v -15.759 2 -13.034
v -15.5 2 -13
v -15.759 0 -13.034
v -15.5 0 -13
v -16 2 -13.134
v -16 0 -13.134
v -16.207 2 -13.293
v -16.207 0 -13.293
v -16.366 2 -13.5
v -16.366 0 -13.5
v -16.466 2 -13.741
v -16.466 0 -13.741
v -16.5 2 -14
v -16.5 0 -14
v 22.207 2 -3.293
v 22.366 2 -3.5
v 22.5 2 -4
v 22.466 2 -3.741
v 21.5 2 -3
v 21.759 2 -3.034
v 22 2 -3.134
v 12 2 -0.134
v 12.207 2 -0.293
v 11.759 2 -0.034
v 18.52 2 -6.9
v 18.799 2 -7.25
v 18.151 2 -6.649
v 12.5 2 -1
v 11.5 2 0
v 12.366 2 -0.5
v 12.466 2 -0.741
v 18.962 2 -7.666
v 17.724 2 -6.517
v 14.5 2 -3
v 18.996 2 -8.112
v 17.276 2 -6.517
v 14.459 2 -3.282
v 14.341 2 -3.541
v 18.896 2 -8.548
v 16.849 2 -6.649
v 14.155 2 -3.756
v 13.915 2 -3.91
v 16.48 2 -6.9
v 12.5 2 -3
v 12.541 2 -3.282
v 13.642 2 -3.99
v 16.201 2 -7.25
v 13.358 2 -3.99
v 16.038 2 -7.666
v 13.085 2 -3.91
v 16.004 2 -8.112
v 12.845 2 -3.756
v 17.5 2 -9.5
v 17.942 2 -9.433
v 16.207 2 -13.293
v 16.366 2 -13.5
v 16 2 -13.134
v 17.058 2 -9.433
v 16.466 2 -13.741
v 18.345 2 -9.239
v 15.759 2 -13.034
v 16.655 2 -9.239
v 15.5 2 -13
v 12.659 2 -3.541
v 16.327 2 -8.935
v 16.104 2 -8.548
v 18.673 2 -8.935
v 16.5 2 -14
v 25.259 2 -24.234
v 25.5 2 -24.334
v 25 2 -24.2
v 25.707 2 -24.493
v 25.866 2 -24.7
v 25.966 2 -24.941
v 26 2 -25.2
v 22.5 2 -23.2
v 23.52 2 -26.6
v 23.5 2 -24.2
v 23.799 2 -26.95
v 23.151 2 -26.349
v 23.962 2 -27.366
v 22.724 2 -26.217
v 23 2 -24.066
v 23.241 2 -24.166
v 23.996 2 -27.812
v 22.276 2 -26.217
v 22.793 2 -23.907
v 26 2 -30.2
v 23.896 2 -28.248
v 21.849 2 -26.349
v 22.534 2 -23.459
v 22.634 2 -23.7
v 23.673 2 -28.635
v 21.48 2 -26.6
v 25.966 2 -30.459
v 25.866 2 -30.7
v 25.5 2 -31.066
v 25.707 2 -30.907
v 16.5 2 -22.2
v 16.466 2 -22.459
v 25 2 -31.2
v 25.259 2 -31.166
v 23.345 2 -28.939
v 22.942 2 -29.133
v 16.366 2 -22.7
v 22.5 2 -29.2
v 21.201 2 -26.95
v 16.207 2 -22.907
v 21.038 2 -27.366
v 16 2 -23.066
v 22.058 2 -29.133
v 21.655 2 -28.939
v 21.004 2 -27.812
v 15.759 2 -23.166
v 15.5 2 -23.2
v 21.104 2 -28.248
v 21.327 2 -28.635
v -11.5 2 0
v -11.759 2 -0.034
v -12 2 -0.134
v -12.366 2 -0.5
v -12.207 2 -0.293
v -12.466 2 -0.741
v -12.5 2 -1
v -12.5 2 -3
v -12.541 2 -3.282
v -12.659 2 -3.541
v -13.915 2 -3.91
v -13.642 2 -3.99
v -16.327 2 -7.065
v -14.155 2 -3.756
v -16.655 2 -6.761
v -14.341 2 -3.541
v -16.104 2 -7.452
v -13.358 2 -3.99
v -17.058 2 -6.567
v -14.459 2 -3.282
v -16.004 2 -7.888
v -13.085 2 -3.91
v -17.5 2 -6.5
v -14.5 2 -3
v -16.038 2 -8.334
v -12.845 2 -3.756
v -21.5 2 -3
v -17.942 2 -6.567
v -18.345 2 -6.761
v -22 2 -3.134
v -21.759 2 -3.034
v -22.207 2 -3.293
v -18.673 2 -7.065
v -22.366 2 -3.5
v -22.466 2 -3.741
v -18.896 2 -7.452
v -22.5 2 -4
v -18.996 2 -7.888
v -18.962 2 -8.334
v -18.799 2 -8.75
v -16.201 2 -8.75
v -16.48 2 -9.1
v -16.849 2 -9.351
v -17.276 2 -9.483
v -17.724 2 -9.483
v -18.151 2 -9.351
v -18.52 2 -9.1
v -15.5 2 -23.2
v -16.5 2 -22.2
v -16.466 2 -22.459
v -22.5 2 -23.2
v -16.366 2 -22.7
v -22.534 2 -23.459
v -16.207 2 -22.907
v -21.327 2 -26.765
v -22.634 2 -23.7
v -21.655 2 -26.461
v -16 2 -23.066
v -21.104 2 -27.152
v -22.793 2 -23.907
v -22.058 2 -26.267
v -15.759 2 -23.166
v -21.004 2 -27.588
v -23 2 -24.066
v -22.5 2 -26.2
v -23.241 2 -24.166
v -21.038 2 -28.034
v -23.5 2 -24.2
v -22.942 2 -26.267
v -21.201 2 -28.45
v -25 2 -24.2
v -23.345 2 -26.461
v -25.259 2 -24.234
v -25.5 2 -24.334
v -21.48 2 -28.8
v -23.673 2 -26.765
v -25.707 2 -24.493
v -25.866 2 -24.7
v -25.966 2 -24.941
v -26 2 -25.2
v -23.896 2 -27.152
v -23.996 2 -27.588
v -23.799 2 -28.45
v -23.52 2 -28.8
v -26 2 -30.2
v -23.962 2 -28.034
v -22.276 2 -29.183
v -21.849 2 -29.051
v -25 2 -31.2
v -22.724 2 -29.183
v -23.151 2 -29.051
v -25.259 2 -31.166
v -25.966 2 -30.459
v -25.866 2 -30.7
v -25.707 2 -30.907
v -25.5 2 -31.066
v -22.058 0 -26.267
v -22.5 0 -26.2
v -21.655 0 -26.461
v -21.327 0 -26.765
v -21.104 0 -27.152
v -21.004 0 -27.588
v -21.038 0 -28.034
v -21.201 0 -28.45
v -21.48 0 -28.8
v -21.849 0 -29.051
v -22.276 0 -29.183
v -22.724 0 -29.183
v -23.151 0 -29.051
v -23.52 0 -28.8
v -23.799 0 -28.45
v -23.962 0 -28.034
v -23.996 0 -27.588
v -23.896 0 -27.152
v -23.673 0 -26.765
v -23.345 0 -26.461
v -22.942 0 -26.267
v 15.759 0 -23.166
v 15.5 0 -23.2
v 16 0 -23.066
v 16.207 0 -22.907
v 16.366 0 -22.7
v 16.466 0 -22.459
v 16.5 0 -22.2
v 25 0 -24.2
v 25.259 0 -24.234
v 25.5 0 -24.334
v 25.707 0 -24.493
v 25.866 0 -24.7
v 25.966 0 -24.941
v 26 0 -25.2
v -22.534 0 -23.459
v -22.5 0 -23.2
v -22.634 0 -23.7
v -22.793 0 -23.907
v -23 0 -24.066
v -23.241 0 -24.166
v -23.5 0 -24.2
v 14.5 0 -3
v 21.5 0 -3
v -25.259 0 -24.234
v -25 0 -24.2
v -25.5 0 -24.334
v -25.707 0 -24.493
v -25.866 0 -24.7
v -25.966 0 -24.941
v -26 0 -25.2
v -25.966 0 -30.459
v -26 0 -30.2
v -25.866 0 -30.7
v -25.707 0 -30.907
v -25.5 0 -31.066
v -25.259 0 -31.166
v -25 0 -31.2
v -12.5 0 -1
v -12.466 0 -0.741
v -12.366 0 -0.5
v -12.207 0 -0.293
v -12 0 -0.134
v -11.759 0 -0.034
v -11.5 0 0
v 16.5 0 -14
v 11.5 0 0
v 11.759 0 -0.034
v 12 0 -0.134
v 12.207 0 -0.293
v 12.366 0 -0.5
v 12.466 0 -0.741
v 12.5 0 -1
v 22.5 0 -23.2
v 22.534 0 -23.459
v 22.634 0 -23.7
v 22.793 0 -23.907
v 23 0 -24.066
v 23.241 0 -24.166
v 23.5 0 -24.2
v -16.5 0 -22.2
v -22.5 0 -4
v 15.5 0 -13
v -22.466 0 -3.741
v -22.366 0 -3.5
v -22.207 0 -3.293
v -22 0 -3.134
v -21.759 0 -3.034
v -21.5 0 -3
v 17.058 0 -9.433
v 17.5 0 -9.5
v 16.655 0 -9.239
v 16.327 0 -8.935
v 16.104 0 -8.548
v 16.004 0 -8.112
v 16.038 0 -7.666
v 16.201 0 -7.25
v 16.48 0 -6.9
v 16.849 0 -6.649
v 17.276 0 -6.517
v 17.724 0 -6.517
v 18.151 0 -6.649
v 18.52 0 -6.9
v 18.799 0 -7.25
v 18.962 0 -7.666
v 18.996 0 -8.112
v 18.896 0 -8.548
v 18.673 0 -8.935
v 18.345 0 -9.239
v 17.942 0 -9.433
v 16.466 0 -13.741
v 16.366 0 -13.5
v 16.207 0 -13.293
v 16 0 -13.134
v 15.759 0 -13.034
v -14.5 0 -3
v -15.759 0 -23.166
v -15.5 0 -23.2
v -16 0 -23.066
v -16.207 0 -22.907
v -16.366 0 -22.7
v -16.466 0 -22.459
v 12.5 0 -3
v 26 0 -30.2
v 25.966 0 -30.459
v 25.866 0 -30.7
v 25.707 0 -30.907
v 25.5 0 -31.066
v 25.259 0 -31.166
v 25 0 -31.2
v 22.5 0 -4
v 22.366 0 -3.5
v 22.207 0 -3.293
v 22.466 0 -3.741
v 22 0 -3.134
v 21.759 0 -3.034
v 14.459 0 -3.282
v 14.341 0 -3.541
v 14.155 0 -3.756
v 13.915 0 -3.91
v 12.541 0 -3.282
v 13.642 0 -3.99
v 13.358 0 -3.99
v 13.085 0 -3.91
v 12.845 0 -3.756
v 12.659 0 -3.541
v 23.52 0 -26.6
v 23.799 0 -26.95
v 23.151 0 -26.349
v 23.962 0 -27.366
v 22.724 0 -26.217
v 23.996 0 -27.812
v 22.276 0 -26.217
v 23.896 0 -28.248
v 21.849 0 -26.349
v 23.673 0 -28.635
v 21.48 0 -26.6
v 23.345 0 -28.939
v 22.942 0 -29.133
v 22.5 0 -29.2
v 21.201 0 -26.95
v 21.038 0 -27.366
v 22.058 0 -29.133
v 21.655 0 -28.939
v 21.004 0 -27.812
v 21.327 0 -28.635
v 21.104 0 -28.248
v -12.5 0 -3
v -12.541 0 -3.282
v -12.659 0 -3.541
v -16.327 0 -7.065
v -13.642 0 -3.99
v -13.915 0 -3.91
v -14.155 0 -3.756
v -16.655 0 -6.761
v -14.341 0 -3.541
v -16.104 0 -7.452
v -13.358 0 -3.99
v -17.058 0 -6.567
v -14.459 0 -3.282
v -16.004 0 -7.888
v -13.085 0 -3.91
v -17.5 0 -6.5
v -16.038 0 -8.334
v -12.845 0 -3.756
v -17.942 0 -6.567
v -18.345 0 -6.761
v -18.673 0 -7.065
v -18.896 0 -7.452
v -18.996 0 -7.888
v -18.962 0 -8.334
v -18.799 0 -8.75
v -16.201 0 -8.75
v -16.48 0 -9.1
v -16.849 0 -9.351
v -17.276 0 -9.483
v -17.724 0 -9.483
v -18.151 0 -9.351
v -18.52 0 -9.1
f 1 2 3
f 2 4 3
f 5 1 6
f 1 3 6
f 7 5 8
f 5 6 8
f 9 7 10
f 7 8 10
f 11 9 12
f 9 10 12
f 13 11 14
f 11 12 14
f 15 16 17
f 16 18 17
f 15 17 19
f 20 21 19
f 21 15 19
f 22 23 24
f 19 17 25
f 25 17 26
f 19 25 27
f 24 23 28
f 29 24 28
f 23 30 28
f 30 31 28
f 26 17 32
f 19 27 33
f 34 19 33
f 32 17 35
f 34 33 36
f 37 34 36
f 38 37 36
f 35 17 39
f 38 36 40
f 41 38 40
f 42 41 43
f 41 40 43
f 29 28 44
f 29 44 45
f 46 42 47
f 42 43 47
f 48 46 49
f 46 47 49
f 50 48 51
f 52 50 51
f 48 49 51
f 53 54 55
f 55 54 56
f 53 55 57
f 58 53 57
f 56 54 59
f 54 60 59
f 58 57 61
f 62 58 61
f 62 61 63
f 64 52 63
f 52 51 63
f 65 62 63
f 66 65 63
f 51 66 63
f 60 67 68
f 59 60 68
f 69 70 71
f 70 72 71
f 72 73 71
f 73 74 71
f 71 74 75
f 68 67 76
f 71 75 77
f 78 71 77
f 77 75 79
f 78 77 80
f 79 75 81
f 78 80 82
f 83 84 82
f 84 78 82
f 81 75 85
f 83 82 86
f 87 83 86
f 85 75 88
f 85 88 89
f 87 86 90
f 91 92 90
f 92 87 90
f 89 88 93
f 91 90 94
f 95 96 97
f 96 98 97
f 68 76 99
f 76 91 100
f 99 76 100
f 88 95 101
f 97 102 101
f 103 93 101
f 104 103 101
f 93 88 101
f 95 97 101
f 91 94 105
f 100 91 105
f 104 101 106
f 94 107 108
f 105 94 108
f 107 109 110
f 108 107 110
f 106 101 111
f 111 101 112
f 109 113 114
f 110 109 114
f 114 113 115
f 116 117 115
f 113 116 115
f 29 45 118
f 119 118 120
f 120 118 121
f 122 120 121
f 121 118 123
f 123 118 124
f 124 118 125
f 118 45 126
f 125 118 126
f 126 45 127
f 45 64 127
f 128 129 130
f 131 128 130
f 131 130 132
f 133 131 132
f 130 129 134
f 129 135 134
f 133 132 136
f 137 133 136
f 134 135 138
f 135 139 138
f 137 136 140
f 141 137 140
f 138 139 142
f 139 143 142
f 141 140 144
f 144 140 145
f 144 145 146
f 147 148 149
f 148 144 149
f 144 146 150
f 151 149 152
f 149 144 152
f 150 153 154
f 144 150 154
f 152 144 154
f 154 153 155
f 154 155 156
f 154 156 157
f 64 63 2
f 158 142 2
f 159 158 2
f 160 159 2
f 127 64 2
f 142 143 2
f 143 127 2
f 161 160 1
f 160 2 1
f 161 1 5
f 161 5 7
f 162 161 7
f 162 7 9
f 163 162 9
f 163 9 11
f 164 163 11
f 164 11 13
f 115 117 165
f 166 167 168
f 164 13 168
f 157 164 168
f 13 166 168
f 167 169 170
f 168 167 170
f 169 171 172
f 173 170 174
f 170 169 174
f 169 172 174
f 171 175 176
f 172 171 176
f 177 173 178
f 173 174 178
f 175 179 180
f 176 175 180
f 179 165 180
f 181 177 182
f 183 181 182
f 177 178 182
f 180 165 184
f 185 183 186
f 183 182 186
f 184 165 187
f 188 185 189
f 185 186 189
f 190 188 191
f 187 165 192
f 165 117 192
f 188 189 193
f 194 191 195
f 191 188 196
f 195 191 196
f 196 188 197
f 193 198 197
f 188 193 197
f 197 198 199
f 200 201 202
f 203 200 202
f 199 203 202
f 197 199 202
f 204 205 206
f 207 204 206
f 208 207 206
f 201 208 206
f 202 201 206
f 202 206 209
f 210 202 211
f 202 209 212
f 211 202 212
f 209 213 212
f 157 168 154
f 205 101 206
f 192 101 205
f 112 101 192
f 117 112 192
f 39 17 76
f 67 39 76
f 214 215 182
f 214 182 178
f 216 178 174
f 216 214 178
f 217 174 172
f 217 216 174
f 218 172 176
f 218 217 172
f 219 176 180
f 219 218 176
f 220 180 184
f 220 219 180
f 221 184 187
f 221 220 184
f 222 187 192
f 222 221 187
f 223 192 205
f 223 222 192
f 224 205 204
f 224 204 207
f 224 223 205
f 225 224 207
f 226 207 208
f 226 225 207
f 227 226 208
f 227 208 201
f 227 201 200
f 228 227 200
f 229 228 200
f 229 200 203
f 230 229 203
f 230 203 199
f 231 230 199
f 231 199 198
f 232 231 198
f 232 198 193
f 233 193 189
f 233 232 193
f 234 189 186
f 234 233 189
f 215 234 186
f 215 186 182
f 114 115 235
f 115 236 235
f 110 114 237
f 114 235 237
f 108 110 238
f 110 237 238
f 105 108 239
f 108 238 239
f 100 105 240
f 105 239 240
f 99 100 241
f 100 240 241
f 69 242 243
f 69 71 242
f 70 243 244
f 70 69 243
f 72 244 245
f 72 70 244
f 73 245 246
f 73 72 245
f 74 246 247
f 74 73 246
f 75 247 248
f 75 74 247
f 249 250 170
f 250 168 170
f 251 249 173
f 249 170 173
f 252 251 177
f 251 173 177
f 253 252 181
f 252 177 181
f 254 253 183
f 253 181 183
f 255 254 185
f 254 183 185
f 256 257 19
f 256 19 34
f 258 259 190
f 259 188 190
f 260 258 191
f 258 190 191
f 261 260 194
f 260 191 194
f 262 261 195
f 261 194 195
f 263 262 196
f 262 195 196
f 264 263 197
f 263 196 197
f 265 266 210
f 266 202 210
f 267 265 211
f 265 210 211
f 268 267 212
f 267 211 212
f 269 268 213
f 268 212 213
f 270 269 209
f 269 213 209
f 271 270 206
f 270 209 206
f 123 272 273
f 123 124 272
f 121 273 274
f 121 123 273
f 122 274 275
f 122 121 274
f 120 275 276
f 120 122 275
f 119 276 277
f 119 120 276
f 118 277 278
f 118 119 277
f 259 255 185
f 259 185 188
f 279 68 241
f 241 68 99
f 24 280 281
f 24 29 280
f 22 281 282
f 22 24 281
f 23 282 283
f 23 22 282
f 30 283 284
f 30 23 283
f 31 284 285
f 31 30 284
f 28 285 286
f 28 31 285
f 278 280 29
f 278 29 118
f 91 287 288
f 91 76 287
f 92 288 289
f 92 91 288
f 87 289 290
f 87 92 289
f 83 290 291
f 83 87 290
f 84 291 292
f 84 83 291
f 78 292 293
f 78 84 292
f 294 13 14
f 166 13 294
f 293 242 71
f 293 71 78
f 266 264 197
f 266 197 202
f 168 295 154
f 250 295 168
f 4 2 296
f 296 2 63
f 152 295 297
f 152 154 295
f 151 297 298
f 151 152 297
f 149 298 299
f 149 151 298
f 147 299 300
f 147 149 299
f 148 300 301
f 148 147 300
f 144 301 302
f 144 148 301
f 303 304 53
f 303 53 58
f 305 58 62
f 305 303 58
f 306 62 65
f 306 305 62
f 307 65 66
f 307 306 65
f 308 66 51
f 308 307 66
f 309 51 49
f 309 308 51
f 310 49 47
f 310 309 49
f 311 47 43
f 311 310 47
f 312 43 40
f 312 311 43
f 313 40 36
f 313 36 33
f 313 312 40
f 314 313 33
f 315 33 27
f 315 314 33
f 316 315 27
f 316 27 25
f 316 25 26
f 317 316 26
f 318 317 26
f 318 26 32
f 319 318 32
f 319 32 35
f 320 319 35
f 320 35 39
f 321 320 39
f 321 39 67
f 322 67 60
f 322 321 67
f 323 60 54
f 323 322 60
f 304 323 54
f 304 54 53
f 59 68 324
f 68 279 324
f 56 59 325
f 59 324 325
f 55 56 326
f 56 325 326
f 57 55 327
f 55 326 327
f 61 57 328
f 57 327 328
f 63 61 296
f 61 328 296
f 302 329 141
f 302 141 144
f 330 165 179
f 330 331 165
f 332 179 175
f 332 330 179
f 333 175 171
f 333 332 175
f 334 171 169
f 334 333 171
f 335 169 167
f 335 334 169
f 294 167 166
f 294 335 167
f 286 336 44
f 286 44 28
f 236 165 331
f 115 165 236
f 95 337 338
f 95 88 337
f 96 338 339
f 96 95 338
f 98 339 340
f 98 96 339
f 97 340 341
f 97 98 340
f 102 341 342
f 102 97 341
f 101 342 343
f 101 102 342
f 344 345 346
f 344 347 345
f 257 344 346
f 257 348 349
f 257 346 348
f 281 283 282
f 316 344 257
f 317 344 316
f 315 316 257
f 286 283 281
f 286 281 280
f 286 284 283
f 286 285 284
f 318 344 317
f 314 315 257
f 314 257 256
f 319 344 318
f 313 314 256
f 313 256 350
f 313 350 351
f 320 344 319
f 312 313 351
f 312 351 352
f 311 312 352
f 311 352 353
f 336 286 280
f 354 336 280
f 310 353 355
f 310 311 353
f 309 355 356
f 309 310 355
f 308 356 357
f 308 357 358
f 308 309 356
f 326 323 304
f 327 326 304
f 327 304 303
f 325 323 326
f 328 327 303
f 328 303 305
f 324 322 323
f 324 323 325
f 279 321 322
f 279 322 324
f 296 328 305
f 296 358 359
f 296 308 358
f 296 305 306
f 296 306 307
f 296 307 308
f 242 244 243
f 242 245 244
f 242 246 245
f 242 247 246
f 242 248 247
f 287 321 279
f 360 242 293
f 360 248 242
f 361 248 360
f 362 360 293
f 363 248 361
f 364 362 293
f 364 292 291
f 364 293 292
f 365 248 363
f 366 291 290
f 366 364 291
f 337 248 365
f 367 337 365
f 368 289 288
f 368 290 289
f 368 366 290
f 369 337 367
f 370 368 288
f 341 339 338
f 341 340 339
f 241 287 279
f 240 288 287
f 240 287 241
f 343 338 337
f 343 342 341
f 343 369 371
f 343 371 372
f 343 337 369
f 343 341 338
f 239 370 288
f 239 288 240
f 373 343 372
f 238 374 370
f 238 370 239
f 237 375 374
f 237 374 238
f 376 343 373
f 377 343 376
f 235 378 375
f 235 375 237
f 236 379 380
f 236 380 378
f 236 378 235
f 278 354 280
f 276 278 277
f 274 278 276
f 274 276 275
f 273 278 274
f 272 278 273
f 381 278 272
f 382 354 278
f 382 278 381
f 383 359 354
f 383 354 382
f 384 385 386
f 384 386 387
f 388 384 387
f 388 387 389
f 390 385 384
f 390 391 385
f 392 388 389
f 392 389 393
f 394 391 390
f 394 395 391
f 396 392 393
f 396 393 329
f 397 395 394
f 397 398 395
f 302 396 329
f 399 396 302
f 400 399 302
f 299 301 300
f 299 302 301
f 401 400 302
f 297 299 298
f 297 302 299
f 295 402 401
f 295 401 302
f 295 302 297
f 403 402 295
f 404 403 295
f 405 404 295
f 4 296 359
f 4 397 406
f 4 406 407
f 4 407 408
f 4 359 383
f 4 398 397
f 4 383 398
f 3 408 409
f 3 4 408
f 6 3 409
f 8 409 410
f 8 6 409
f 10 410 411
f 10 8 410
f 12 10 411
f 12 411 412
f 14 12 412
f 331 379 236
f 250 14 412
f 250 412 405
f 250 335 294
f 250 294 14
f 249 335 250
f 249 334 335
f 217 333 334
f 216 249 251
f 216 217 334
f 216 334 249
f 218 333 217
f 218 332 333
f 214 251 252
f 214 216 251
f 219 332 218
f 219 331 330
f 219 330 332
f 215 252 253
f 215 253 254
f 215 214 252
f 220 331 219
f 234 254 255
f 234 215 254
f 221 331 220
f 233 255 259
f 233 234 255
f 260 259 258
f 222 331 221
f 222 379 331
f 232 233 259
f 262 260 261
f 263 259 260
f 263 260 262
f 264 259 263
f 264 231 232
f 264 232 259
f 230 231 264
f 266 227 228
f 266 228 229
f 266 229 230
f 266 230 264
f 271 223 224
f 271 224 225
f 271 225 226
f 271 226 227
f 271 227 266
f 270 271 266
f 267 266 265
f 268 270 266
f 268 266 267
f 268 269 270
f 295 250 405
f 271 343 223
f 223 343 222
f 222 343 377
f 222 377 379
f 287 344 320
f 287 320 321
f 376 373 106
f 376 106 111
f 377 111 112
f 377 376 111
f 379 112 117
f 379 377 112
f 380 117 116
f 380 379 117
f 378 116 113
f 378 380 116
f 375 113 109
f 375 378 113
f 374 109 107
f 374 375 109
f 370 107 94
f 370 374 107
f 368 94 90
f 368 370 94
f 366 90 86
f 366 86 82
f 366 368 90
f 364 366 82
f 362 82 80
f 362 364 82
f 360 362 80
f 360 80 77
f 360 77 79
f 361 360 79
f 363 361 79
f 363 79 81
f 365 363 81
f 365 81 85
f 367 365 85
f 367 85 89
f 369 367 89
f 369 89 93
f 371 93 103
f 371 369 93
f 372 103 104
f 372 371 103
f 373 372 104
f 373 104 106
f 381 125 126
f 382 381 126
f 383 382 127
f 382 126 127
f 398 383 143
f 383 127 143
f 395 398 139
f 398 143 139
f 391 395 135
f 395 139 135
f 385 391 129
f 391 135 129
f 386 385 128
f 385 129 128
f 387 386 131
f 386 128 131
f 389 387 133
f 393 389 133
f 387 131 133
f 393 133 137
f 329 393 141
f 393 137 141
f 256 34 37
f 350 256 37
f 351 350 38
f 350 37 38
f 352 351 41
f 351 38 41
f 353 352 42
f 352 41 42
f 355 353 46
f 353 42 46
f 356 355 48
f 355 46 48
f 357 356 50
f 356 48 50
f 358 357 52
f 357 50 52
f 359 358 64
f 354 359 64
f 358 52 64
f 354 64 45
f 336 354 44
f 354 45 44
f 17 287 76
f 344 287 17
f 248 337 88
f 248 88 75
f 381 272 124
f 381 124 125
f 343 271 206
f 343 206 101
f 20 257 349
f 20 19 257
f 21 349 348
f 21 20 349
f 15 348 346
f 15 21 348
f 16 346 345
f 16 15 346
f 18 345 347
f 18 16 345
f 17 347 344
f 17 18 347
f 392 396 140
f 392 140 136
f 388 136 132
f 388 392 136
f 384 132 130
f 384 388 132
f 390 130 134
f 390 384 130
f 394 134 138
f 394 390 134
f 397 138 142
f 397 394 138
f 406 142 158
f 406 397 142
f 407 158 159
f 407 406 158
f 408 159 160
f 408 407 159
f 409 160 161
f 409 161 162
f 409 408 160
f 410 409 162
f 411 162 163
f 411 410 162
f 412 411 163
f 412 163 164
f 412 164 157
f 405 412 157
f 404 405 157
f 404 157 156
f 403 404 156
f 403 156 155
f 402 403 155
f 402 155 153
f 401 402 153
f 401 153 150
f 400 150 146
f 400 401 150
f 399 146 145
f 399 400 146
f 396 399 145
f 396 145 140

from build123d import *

# Parameters (mm, degrees)
SKETCH_1_R          = 1.5
EXTRUDE_1_DEPTH     = 2
SKETCH_2_R          = 1
SKETCH_2_W          = 33
SKETCH_2_H          = 10.2
CUT_EXTRUDE_1_DEPTH = 41.662513449
FILLET_1_R          = 1


with BuildPart() as part:
    # 草图1 → 凸台-拉伸1 (new body)
    with BuildSketch(Plane(origin=(0, 0, 0), x_dir=(1, 0, 0), z_dir=(0, 1, 0))):
        Polygon((-22.5, 3), (-22.5, 24.2), (-26, 24.2), (-26, 31.2), (26, 31.2), (26, 24.2), (22.5, 24.2), (22.5, 3), (12.5, 3), (12.5, 0), (-12.5, 0), (-12.5, 3), align=None)
        with Locations(Location((-22.5, 27.7, 0), (0, 0, 270))):
            Circle(SKETCH_1_R, mode=Mode.SUBTRACT)
        with Locations(Location((22.5, 27.7, 0), (0, 0, 90))):
            Circle(SKETCH_1_R, mode=Mode.SUBTRACT)
        with Locations(Location((-17.5, 8, 0), (0, 0, 270))):
            Circle(SKETCH_1_R, mode=Mode.SUBTRACT)
        with Locations(Location((17.5, 8, 0), (0, 0, 90))):
            Circle(SKETCH_1_R, mode=Mode.SUBTRACT)
    extrude(amount=EXTRUDE_1_DEPTH)

    # 草图2 → 切除-拉伸1 (cut, through all)
    with BuildSketch(Plane(origin=(0, 2, 0), x_dir=(1, 0, 0), z_dir=(0, 1, 0))):
        with Locations((-13.5, 3)):
            Circle(SKETCH_2_R)
        with Locations((13.5, 3)):
            Circle(SKETCH_2_R)
        with Locations((0, 18.1)):
            Rectangle(SKETCH_2_W, SKETCH_2_H)
    extrude(amount=-CUT_EXTRUDE_1_DEPTH, mode=Mode.SUBTRACT)

    # 圆角1
    fillet_1_edges = [part.edges().sort_by_distance(p)[0] for p in [
        (26, 1, -24.2),
        (22.5, 1, -24.2),
        (22.5, 1, -3),
        (12.5, 1, 0),
        (-12.5, 1, 0),
        (-22.5, 1, -3),
        (-22.5, 1, -24.2),
        (-26, 1, -24.2),
        (-26, 1, -31.2),
        (26, 1, -31.2),
        (-16.5, 1, -13),
        (-16.5, 1, -23.2),
        (16.5, 1, -23.2),
        (16.5, 1, -13),
    ]]
    fillet(fillet_1_edges, radius=FILLET_1_R)


solid = part.part
